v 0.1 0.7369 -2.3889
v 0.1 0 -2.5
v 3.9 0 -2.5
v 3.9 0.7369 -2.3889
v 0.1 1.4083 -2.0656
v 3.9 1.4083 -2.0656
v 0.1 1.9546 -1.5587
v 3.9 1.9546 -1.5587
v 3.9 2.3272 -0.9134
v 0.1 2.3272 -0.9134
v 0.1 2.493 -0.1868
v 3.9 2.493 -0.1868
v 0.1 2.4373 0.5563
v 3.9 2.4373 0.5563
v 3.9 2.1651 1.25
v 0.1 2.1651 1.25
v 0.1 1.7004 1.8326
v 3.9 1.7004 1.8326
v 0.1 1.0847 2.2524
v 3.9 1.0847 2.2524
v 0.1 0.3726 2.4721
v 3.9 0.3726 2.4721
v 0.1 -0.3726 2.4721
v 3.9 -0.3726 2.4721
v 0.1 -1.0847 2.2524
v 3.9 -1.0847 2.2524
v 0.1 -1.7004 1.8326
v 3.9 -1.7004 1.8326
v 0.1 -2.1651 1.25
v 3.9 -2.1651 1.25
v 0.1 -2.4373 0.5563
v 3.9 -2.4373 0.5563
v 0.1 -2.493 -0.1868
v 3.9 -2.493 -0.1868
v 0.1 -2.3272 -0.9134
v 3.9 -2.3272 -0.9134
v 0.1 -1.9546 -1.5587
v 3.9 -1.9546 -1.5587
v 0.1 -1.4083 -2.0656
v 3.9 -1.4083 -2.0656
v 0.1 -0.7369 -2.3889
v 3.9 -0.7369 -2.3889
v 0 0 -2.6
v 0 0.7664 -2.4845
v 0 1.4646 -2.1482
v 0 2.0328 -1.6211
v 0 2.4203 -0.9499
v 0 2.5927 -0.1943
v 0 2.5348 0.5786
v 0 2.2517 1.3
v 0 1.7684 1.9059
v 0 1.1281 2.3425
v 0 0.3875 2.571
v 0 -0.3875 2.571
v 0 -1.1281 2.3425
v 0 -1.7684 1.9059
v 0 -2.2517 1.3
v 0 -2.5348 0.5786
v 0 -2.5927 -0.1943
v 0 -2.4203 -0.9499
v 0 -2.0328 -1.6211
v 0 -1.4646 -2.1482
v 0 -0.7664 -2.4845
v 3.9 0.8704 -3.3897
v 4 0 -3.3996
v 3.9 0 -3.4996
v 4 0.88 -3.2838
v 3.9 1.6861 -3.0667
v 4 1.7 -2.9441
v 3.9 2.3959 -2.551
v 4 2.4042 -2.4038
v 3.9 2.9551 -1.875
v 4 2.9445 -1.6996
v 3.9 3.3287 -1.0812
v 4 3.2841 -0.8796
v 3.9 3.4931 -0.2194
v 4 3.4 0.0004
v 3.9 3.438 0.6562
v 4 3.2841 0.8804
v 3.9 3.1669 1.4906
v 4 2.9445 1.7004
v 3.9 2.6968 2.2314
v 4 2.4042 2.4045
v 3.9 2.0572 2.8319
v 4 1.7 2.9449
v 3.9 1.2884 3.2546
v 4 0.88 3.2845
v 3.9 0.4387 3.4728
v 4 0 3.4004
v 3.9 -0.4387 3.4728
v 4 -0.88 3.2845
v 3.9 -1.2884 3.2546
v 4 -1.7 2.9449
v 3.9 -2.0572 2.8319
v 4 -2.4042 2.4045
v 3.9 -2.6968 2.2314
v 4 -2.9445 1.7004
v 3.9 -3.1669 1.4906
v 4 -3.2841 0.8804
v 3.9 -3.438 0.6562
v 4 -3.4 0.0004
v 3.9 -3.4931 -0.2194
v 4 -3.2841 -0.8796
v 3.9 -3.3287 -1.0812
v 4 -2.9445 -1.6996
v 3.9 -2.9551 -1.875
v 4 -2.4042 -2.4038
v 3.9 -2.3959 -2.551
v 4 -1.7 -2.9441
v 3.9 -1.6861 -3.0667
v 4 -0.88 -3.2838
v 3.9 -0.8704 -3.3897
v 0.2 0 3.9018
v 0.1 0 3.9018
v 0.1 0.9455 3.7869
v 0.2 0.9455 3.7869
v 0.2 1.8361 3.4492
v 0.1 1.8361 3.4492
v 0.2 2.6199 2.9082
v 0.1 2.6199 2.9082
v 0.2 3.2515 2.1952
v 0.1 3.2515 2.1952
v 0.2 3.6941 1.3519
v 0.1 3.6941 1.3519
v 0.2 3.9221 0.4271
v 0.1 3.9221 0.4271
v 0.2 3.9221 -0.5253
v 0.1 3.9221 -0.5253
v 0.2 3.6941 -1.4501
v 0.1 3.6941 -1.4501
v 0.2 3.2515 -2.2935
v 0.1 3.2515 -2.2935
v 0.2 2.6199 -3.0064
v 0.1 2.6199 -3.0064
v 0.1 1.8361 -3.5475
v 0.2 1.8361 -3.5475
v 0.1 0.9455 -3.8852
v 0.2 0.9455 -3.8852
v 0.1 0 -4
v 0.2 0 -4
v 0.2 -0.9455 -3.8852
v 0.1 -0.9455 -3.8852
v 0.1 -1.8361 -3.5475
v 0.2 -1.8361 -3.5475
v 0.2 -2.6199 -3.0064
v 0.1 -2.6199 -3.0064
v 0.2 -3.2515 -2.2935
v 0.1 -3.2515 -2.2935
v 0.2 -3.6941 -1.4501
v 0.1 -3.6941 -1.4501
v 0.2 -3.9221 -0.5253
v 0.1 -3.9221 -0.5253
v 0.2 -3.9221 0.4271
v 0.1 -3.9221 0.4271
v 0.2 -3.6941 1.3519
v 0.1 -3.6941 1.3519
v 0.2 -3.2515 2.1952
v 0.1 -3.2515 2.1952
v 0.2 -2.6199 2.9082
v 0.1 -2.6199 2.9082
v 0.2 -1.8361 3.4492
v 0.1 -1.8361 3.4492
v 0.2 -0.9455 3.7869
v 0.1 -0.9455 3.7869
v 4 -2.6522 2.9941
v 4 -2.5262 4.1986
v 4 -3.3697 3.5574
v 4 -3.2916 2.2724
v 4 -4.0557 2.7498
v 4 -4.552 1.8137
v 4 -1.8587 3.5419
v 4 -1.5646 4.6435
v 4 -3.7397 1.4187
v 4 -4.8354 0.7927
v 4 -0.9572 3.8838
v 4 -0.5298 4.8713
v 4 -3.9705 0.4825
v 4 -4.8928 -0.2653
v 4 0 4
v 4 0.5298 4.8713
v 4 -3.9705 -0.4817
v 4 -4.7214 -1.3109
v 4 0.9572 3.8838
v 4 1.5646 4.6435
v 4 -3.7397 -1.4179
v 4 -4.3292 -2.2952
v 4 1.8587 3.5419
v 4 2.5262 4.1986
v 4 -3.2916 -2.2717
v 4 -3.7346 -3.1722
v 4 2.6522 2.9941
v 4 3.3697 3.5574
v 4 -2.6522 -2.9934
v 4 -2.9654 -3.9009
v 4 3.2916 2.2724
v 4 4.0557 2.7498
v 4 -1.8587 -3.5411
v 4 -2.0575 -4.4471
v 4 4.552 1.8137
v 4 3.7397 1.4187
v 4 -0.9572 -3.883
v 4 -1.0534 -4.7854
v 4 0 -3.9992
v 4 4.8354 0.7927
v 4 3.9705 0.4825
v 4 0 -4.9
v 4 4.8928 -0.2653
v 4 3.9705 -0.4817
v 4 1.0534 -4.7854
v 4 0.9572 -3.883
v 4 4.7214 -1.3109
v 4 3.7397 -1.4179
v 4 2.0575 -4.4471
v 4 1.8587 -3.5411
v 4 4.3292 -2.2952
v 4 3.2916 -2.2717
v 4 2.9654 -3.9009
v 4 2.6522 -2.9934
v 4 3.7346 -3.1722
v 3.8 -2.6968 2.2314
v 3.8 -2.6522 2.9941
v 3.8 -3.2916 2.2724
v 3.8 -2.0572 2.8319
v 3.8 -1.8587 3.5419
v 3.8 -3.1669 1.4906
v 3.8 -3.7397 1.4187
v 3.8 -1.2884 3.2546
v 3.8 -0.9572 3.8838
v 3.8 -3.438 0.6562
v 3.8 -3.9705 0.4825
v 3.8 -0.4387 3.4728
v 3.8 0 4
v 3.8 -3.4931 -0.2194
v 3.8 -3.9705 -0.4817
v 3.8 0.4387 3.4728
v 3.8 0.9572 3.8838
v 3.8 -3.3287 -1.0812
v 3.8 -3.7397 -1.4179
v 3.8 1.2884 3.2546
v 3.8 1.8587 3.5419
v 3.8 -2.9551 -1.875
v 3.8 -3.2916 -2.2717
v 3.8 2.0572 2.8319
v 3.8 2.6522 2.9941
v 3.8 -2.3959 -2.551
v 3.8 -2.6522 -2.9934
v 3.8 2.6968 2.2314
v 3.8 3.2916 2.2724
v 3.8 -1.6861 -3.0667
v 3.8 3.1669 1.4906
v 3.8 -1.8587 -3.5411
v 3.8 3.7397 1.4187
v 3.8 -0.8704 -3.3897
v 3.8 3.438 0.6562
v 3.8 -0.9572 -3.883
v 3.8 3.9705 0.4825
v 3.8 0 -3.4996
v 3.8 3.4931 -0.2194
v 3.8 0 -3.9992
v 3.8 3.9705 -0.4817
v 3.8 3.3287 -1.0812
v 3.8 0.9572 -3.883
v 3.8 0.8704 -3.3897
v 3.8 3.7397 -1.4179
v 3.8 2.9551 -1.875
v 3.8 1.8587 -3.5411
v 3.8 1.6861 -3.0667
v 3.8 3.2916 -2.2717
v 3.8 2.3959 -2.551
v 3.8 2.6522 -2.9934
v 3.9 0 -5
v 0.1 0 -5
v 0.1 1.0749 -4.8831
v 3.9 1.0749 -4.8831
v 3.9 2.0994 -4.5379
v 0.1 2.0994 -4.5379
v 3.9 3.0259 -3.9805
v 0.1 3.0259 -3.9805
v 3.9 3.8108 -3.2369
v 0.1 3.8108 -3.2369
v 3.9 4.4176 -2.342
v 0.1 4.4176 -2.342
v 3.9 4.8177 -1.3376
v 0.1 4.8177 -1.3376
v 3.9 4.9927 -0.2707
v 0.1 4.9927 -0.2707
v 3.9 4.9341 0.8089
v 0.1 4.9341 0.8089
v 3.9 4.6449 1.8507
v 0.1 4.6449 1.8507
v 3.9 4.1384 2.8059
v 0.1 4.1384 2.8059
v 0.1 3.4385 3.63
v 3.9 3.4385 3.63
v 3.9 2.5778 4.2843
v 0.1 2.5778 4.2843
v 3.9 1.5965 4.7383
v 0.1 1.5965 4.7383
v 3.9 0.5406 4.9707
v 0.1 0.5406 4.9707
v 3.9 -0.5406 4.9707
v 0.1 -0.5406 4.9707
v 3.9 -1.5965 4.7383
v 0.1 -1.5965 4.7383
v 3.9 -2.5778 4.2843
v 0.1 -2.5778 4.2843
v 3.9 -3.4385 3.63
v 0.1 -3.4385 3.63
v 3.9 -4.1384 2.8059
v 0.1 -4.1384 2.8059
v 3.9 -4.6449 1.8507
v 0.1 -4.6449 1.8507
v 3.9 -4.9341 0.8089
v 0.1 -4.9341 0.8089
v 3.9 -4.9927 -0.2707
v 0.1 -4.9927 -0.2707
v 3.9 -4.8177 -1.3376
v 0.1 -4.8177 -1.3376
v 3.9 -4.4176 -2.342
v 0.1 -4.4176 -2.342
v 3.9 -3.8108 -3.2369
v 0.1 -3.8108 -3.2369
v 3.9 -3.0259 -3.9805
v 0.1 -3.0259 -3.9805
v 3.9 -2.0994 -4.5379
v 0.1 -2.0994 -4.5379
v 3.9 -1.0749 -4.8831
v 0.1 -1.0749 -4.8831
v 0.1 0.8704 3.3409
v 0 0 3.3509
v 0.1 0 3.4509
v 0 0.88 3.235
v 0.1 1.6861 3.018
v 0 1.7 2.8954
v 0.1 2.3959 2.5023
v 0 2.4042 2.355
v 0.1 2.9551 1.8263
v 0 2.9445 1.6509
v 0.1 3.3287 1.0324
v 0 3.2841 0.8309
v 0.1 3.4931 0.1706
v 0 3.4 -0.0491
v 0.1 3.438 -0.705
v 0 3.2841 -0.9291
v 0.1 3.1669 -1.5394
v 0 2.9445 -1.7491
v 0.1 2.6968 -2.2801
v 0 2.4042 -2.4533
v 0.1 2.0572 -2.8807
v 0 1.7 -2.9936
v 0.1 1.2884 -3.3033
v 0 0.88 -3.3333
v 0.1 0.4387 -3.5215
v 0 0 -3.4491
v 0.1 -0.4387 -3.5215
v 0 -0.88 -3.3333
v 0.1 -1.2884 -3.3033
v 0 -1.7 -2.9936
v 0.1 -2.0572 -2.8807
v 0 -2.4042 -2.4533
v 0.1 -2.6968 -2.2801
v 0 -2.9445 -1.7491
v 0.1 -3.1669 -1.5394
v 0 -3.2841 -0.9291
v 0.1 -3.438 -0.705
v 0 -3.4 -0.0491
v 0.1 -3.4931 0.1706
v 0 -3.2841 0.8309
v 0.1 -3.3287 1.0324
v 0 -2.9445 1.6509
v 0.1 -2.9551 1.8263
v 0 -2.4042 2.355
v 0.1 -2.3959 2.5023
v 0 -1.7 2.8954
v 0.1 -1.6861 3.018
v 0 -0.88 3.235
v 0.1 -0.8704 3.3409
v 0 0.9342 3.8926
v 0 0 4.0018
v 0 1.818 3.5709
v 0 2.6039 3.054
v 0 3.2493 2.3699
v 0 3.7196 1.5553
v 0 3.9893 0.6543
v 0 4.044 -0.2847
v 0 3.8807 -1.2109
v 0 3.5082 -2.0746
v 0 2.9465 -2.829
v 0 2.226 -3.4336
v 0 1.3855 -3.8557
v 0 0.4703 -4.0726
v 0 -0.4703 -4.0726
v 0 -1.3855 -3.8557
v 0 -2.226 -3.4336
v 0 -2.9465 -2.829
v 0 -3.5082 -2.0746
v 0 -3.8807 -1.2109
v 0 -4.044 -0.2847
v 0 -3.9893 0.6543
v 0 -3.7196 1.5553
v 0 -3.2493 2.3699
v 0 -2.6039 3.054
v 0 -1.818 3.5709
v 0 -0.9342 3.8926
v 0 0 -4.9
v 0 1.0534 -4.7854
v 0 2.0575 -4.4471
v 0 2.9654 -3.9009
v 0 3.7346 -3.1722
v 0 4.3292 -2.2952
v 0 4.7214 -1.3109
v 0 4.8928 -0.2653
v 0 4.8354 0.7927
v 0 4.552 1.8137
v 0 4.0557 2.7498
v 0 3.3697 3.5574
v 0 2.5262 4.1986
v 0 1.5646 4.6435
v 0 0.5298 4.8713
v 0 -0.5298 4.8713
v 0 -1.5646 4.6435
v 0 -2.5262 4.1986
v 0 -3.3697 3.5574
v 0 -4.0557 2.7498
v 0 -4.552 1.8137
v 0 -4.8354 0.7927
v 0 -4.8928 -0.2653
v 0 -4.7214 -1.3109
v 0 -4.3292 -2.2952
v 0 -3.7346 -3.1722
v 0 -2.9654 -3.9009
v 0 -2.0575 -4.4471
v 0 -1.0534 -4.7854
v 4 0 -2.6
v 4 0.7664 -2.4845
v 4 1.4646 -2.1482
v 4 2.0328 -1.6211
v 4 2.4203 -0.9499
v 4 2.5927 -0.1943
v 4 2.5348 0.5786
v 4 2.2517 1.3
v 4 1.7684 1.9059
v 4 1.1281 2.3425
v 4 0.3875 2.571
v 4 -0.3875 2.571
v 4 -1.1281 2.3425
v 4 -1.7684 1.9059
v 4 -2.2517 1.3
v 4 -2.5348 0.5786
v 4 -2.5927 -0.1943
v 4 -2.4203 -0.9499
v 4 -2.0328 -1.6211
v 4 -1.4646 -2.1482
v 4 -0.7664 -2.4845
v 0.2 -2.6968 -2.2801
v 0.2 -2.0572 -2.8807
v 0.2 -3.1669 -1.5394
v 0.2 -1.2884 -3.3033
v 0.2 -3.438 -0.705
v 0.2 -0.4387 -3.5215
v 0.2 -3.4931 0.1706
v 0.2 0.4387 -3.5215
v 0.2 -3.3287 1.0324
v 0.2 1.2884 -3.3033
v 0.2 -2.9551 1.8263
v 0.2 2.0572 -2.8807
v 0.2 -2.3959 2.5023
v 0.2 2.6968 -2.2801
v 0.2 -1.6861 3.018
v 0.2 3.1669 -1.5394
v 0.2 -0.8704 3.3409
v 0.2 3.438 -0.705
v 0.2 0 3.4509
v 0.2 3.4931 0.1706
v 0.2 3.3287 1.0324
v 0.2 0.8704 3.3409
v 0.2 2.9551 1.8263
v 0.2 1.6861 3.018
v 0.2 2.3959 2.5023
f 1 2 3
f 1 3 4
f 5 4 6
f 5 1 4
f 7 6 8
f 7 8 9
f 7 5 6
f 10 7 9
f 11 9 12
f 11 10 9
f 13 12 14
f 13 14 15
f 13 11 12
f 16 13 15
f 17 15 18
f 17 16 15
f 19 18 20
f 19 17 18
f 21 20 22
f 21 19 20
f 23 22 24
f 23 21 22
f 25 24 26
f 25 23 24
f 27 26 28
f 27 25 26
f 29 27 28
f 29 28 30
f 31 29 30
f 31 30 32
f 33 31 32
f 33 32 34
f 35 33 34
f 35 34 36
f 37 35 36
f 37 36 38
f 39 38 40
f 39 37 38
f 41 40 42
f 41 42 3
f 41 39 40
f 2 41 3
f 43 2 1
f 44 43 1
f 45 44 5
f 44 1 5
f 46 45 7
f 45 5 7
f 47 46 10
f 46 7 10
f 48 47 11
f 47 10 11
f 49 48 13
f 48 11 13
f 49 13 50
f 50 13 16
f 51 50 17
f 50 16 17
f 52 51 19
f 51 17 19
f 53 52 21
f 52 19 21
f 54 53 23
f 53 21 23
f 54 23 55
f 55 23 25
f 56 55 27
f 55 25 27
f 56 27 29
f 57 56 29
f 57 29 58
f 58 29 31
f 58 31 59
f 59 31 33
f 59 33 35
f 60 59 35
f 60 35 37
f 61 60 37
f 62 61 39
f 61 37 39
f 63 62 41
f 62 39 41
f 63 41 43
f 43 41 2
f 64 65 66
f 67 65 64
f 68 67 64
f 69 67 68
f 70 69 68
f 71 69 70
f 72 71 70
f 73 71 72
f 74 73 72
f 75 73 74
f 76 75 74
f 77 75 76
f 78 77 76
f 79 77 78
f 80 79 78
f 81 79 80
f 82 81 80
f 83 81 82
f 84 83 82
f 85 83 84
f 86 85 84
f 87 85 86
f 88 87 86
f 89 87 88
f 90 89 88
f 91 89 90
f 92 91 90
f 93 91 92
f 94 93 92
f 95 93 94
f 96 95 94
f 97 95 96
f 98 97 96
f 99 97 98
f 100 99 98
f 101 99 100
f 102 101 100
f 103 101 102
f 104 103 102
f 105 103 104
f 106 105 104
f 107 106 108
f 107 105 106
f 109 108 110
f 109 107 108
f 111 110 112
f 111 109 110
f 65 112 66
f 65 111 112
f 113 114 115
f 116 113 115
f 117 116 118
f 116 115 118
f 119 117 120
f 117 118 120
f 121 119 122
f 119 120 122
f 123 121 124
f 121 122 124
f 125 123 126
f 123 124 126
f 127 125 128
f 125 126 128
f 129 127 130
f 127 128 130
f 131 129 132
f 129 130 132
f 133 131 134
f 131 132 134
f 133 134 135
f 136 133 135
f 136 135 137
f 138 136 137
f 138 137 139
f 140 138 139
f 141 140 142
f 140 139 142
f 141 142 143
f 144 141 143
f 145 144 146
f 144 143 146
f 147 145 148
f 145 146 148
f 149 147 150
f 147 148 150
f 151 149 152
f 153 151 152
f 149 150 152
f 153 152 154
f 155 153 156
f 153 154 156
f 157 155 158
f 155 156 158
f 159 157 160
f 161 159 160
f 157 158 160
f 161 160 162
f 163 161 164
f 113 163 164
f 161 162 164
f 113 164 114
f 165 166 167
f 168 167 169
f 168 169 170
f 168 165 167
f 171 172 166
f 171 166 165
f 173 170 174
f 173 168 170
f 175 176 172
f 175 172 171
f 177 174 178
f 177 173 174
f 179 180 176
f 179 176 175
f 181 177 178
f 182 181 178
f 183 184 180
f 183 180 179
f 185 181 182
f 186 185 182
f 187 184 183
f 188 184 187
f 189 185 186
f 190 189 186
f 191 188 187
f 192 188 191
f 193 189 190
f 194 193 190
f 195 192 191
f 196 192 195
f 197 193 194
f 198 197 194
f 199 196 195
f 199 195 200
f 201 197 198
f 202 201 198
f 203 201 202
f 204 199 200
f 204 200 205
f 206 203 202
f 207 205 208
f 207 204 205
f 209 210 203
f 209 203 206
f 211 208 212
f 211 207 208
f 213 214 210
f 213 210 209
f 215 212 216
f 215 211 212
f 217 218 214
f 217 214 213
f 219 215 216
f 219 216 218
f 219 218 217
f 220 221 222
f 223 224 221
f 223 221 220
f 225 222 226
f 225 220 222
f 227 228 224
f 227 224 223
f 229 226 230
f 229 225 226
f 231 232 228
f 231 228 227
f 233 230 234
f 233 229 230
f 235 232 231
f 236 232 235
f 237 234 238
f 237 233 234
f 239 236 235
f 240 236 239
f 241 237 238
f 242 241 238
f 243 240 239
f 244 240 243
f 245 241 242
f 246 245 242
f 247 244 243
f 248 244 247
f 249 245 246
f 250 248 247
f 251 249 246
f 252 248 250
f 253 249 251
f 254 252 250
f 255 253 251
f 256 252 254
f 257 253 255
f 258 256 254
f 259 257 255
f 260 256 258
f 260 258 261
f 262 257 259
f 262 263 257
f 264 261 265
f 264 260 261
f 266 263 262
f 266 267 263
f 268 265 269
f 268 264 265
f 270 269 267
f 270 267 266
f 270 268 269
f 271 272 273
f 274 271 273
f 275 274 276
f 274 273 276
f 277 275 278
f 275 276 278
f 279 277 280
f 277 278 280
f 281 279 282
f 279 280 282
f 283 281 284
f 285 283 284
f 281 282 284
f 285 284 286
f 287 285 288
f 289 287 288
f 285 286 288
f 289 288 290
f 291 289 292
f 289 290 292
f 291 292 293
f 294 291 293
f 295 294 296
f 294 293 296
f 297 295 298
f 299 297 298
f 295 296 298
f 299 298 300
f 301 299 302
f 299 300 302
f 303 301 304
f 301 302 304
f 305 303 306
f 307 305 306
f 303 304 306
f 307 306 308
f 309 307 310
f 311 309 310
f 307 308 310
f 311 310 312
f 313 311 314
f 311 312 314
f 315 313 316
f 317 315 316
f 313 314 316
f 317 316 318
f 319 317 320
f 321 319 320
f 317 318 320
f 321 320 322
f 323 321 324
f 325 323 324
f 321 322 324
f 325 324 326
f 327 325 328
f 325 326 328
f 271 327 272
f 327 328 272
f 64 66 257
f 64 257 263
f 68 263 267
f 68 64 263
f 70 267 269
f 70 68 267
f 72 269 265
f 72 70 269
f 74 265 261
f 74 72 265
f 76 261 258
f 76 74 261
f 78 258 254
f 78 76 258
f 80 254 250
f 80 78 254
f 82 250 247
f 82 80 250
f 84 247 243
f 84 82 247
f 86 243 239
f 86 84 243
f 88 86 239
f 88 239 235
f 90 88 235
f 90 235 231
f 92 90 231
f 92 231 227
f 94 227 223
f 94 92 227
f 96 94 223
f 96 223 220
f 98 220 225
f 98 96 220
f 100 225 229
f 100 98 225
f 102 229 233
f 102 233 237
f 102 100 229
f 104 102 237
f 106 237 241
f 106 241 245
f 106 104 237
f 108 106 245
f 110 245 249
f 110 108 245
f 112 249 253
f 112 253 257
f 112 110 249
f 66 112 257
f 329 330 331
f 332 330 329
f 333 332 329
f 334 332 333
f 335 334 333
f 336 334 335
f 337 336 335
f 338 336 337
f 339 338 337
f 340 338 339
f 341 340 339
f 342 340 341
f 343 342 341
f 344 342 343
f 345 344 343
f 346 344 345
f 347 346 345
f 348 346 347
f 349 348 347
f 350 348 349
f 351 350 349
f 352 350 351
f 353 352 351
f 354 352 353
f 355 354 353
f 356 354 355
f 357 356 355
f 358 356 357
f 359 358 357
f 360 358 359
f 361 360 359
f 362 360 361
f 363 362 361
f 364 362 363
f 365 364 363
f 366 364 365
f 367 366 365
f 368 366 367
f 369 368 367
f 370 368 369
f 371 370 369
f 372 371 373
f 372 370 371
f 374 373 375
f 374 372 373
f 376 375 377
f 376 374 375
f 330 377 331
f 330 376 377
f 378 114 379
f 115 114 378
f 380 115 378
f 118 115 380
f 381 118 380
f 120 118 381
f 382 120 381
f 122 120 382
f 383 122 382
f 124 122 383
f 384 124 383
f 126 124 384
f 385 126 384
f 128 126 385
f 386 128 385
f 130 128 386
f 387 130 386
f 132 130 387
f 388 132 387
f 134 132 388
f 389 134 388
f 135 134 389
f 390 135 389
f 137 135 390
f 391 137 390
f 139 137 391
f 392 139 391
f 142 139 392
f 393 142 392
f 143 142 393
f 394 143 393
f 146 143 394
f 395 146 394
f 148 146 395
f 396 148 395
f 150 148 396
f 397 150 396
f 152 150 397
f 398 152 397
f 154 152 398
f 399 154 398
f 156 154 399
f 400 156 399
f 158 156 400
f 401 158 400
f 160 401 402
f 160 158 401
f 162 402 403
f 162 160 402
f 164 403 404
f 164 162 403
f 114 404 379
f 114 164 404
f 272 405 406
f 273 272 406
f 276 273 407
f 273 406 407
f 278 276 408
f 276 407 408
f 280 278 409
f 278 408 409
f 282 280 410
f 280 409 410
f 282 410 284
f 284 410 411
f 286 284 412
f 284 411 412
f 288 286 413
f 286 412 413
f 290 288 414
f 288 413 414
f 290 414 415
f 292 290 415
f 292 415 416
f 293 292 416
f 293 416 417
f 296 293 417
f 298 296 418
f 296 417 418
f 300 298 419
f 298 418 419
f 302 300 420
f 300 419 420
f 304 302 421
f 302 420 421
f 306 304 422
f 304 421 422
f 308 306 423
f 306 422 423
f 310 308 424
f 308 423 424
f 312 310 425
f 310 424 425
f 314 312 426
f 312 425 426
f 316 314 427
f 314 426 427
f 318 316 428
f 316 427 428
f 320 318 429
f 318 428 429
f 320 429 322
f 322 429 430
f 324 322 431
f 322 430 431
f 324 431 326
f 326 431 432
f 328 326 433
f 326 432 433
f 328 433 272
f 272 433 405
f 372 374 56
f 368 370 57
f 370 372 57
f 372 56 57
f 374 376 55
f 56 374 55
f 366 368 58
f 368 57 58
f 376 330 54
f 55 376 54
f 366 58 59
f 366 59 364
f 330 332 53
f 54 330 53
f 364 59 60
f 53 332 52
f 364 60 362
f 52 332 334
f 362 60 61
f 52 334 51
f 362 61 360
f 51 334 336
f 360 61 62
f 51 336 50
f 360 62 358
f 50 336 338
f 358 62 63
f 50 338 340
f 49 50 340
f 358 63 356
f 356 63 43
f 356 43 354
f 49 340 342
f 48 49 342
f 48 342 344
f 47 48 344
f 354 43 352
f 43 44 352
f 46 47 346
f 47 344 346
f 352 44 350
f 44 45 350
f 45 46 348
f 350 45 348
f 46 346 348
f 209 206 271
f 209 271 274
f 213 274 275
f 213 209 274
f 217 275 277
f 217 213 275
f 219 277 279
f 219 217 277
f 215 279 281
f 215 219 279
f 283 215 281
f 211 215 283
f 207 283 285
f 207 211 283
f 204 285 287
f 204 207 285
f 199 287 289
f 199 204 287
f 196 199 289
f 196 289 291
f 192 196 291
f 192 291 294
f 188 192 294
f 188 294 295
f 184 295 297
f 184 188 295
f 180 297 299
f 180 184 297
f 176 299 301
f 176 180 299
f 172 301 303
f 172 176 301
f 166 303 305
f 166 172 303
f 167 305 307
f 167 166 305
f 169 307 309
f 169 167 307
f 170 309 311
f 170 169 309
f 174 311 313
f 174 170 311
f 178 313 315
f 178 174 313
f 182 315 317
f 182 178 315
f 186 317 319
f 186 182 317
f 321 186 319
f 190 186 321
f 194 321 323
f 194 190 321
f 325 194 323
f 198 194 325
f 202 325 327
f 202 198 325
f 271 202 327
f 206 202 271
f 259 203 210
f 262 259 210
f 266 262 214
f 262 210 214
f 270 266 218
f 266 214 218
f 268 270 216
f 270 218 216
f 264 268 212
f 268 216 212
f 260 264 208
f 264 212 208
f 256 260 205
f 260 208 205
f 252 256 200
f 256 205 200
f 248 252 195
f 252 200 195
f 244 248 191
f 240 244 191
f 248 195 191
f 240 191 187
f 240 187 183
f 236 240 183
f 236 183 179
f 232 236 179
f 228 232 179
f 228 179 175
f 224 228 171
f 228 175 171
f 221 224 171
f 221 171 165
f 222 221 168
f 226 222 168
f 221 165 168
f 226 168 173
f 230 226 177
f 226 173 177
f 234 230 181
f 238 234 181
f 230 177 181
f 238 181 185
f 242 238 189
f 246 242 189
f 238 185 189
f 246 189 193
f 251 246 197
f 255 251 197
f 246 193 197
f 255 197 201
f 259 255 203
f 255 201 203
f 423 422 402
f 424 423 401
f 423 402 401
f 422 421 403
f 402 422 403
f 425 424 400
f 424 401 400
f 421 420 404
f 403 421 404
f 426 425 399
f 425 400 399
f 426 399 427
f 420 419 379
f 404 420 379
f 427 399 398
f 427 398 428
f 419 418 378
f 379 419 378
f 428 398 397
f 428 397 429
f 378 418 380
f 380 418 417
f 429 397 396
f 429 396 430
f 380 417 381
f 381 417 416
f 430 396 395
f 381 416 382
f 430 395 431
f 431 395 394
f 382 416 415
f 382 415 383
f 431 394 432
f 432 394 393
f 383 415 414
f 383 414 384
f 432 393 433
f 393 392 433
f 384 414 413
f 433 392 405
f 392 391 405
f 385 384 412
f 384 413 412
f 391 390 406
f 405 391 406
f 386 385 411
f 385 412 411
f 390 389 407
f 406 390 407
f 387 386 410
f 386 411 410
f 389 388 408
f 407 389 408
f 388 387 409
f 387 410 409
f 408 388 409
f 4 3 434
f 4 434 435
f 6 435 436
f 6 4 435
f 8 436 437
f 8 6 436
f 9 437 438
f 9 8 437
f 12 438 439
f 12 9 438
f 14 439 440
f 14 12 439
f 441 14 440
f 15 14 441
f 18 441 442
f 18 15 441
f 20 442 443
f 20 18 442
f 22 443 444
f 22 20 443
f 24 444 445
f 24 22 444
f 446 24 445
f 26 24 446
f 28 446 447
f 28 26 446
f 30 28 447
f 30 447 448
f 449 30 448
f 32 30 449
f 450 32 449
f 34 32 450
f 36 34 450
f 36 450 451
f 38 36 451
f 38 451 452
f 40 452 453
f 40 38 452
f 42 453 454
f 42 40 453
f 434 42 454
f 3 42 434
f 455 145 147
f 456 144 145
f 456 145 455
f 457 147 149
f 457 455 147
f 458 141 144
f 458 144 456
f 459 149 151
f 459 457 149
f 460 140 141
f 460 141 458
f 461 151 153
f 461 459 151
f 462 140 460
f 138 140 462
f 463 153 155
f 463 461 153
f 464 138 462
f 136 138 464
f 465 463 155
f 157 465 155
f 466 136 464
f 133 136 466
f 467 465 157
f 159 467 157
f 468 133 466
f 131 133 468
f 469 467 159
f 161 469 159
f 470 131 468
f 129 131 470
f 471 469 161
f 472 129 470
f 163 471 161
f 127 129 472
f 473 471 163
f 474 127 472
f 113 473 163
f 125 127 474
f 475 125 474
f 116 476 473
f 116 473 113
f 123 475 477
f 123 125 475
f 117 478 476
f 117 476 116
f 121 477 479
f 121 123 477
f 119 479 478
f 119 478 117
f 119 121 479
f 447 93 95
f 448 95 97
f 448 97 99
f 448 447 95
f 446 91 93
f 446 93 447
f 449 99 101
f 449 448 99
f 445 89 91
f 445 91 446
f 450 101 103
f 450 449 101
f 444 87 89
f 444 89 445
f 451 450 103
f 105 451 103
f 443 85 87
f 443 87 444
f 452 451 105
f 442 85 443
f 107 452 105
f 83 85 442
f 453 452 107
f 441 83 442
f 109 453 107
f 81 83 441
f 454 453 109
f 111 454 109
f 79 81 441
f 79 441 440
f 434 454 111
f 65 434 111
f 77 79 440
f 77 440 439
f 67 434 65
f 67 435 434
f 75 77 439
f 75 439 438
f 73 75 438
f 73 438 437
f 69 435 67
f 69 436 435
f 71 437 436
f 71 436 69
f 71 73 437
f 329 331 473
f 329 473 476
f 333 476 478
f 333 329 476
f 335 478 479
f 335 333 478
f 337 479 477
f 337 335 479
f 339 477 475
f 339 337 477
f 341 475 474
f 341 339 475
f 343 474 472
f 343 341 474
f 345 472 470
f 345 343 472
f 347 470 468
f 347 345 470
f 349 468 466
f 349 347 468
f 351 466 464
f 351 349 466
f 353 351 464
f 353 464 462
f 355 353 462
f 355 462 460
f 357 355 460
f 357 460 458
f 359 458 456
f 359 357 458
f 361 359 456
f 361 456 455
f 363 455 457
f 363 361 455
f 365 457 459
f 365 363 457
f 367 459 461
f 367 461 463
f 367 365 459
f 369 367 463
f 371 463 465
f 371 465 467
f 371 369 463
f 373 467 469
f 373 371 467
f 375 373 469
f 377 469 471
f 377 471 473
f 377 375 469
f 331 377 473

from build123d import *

# Parameters (mm, degrees)
SKETCH_1_R          = 5
SKETCH_1_R_2        = 2.5
EXTRUDE_1_DEPTH     = 4
SKETCH_2_R          = 3.999624375
SKETCH_2_R_2        = 3.5
CUT_EXTRUDE_1_DEPTH = 0.2
SKETCH_3_R          = 3.950876812
SKETCH_3_R_2        = 3.5
CUT_EXTRUDE_2_DEPTH = 0.2
CHAMFER_1_SIZE      = 0.1


with BuildPart() as part:
    # 草图1 → 凸台-拉伸1 (new body)
    with BuildSketch(Plane(origin=(0, 0, 0), x_dir=(0, 0, -1), z_dir=(1, 0, 0))):
        Circle(SKETCH_1_R)
        Circle(SKETCH_1_R_2, mode=Mode.SUBTRACT)
    extrude(amount=EXTRUDE_1_DEPTH)

    # 草图2 → 切除-拉伸1 (cut)
    with BuildSketch(Plane(origin=(4, 0, 0), x_dir=(0, 0, -1), z_dir=(1, 0, 0))):
        with Locations((-0.000375625, 0)):
            Circle(SKETCH_2_R)
        with Locations((-0.000375625, 0)):
            Circle(SKETCH_2_R_2, mode=Mode.SUBTRACT)
    extrude(amount=-CUT_EXTRUDE_1_DEPTH, mode=Mode.SUBTRACT)

    # 草图3 → 切除-拉伸2 (cut)
    with BuildSketch(Plane.ZY):
        with Locations((-0.049123188, 0)):
            Circle(SKETCH_3_R)
        with Locations((-0.049123188, 0)):
            Circle(SKETCH_3_R_2, mode=Mode.SUBTRACT)
    extrude(amount=-CUT_EXTRUDE_2_DEPTH, mode=Mode.SUBTRACT)

    # 倒角1
    chamfer_1_edges = [part.edges().sort_by_distance(p)[0] for p in [
        (4, 0, 3.500375625),
        (0, 0, 5),
        (0, 0, -4),
        (0, 0, -3.549123188),
        (4, 0, 5),
        (0, 0, 2.5),
        (4, 0, 2.5),
    ]]
    chamfer(chamfer_1_edges, length=CHAMFER_1_SIZE)


solid = part.part
